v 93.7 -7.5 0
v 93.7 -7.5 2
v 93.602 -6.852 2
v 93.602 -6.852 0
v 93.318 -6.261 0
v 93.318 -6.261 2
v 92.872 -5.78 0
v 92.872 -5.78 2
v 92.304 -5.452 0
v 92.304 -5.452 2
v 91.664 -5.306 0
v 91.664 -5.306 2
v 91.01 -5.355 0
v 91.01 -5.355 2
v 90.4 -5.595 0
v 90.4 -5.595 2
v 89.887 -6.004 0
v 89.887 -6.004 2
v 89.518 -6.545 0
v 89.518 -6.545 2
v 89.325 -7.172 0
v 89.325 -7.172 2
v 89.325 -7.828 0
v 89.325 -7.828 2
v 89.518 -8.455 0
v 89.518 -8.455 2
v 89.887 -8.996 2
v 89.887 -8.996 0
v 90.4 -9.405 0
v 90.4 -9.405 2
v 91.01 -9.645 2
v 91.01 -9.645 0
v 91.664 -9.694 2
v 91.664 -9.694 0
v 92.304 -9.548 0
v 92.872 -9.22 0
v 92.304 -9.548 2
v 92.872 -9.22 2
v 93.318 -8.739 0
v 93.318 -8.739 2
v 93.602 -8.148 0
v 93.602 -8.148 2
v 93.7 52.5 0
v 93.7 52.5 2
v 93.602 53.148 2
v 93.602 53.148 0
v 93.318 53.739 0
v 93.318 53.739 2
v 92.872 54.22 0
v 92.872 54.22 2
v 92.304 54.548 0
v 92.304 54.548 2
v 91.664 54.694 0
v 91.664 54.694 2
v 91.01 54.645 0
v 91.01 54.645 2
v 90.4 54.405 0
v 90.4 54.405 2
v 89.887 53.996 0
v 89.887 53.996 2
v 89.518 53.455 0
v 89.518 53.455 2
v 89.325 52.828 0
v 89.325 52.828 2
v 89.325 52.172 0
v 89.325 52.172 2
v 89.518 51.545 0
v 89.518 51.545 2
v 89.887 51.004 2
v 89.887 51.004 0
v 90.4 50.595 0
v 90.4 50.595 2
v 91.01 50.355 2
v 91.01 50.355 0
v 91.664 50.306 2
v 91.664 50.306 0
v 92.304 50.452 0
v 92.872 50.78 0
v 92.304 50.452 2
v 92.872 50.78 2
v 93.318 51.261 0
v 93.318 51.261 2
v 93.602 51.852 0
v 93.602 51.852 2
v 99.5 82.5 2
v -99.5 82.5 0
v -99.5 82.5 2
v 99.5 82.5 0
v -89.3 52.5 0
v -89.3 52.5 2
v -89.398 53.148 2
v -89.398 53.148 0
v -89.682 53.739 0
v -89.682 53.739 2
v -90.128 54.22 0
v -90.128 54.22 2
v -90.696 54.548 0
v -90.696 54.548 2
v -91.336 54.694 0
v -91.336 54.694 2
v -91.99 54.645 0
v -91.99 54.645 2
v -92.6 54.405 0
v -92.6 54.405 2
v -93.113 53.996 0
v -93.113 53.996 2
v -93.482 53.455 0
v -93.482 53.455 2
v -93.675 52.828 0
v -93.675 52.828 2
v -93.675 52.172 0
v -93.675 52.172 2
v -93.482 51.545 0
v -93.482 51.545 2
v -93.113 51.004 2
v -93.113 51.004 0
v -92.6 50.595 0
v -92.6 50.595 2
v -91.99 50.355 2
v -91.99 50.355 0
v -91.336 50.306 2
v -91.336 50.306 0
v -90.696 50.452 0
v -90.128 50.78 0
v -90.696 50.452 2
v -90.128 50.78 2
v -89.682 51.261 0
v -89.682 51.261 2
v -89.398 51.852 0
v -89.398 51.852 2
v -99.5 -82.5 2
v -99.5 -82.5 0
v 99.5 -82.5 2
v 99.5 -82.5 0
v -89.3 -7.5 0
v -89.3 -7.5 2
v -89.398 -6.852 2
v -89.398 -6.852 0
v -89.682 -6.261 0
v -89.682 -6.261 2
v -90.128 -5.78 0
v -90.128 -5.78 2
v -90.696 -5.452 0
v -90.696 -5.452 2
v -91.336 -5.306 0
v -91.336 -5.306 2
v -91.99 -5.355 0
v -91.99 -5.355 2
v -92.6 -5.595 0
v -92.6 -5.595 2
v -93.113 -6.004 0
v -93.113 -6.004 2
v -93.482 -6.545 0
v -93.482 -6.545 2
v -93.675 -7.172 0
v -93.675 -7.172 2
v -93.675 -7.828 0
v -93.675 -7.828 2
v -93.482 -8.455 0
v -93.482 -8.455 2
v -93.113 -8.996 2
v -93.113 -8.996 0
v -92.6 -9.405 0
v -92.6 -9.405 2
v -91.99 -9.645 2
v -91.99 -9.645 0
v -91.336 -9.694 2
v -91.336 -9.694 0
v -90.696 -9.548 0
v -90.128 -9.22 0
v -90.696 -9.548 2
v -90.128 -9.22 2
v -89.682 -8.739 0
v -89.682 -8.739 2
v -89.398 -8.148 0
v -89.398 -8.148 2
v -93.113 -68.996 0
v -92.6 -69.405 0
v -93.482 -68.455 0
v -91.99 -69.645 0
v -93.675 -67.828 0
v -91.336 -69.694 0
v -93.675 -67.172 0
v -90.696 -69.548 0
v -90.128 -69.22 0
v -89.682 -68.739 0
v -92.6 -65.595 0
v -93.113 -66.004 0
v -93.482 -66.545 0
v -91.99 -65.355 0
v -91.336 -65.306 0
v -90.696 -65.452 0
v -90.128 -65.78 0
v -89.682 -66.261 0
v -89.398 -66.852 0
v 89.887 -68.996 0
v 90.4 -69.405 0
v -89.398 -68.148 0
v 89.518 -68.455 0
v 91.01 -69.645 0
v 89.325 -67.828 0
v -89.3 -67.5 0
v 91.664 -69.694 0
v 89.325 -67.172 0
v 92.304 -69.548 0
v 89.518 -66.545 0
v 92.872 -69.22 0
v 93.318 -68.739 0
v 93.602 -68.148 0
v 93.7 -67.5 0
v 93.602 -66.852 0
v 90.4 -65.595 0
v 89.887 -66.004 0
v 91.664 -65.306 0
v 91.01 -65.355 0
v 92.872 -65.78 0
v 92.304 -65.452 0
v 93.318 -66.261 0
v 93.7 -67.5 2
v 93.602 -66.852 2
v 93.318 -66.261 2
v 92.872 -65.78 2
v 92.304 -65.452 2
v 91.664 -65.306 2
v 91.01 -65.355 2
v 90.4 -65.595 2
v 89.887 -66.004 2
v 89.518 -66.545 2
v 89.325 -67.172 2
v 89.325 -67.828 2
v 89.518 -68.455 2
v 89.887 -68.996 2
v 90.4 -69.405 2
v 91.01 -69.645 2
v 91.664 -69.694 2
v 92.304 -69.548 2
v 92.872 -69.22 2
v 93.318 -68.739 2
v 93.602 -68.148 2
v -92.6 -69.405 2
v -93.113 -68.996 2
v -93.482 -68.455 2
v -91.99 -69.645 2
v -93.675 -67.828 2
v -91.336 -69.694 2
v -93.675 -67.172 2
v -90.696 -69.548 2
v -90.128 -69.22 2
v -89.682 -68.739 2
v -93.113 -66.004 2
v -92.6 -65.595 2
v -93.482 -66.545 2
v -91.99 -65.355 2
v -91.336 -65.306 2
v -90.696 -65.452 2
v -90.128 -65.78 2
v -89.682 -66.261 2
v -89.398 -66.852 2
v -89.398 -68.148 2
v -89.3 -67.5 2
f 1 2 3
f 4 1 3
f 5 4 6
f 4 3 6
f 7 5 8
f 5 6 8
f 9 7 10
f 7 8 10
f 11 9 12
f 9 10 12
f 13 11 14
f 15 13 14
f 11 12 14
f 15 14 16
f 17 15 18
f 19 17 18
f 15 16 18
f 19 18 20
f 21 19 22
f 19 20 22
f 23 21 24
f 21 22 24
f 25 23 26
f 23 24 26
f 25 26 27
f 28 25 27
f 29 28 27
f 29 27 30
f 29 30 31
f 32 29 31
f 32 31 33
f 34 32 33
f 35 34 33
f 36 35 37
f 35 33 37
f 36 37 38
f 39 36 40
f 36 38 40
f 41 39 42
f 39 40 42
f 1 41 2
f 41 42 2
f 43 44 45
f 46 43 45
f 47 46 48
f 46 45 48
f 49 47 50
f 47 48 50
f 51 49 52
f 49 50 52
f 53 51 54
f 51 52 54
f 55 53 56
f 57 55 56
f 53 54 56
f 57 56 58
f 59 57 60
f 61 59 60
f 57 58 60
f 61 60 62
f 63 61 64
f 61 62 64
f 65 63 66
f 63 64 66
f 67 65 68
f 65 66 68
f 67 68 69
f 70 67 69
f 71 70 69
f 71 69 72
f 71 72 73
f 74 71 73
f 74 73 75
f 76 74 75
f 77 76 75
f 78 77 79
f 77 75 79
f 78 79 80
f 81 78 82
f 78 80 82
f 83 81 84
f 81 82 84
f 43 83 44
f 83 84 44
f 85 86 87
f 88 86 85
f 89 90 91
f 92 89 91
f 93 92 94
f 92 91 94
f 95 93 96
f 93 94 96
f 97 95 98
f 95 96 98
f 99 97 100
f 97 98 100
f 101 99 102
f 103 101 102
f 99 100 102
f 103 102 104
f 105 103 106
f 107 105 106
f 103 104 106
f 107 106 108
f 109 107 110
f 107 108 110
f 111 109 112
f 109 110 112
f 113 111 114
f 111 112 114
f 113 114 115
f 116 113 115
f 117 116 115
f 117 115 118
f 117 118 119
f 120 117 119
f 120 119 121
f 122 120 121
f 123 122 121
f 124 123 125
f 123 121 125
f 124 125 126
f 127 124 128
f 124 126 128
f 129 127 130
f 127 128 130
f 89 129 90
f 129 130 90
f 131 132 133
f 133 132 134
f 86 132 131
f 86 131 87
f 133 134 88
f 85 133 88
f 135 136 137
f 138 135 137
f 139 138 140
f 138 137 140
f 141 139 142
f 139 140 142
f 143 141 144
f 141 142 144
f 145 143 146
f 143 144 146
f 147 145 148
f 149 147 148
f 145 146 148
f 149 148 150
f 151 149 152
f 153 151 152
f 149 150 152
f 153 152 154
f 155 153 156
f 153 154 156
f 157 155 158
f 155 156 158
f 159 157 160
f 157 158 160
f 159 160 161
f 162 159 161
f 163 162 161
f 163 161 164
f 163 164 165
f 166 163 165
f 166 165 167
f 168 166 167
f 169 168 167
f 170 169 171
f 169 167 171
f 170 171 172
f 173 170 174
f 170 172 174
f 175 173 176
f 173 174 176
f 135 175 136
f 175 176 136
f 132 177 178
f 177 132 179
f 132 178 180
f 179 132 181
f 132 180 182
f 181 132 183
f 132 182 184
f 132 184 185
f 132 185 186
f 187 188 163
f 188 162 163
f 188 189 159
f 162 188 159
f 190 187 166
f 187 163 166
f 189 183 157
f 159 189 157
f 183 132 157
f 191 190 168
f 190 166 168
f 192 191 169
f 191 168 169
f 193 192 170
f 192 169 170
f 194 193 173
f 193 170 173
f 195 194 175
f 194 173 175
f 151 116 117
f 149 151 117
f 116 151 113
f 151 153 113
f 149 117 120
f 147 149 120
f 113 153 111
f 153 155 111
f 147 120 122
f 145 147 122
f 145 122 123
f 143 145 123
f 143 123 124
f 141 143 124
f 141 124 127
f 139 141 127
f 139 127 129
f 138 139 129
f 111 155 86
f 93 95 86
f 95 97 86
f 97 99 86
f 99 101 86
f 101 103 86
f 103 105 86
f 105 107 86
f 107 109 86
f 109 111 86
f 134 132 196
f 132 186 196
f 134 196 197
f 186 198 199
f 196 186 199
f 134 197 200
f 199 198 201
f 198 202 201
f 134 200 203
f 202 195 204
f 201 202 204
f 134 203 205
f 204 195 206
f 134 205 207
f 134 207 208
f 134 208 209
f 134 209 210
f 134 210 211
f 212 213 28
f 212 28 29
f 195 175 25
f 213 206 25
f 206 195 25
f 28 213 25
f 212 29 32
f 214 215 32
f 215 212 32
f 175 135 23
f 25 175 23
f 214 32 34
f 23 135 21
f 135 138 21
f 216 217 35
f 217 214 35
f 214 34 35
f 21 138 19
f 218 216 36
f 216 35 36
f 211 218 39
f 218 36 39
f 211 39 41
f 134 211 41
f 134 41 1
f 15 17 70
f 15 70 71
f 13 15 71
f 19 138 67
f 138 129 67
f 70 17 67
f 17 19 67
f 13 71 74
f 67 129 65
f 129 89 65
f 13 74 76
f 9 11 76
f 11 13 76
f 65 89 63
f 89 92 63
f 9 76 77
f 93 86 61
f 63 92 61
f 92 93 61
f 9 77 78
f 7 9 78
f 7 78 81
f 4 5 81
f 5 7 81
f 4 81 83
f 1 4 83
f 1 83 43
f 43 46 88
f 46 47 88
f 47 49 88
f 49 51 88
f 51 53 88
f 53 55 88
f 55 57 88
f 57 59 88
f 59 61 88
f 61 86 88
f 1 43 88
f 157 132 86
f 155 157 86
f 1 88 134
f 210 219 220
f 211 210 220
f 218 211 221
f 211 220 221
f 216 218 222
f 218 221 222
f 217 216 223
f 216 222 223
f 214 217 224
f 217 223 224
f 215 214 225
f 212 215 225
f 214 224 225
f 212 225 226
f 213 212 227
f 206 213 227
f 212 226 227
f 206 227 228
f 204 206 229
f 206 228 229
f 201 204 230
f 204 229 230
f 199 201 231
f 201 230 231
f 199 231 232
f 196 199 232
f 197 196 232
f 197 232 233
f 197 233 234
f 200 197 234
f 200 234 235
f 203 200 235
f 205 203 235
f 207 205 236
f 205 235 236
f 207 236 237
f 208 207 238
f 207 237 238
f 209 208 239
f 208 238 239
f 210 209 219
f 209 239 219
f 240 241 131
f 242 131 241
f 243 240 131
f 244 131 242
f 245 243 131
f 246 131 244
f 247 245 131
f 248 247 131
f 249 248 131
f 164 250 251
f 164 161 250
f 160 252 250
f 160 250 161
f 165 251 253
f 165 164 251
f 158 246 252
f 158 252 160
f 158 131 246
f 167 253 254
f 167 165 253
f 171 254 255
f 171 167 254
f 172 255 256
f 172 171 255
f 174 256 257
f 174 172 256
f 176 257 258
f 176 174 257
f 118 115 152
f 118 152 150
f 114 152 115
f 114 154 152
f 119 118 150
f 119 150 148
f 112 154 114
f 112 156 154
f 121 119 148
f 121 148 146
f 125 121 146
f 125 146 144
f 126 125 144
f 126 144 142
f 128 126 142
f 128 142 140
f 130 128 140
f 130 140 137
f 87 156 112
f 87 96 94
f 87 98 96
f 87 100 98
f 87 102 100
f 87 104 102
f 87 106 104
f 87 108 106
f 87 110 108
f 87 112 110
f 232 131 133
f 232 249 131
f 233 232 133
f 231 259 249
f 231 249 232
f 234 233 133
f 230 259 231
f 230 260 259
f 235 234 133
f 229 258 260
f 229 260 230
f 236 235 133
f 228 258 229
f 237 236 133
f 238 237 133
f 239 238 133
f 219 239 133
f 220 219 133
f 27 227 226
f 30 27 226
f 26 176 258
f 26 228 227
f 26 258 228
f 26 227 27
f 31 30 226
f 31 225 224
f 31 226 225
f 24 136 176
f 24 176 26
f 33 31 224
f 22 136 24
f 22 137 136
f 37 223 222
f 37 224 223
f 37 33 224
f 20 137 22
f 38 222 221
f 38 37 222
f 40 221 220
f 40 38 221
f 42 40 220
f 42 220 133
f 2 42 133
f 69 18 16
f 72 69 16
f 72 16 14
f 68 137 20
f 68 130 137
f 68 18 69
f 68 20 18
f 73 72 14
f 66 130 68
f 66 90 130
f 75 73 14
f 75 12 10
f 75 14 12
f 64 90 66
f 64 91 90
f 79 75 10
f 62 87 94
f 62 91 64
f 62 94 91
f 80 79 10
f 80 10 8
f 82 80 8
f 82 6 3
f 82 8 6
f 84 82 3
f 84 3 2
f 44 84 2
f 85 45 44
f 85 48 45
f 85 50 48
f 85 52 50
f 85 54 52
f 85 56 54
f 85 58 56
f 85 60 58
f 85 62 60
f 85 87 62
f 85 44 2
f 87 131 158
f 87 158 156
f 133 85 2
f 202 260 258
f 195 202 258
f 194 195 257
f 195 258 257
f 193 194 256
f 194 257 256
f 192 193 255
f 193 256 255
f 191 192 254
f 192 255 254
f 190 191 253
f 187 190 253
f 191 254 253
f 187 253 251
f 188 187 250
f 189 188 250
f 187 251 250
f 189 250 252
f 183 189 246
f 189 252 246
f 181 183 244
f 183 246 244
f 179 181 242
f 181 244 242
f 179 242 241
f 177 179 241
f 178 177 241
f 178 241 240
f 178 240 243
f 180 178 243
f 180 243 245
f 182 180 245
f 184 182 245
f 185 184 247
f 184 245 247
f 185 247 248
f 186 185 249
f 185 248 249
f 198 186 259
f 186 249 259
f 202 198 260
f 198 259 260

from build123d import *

# Parameters (mm, degrees)
SKETCH_1_W          = 199
SKETCH_1_H          = 165
EXTRUDE_1_DEPTH     = 2
SKETCH_2_R          = 2.2
CUT_EXTRUDE_1_DEPTH = 2
SKETCH_3_R          = 2.2
CUT_EXTRUDE_2_DEPTH = 2


with BuildPart() as part:
    # ｽｹｯﾁ1 → ﾎﾞｽ - 押し出し1 (new body)
    with BuildSketch(Plane.XY):
        Rectangle(SKETCH_1_W, SKETCH_1_H)
    extrude(amount=EXTRUDE_1_DEPTH)

    # ｽｹｯﾁ2 → ｶｯﾄ - 押し出し1 (cut)
    with BuildSketch(Plane.XY.offset(2)):
        with Locations((-91.5, -67.5)):
            Circle(SKETCH_2_R)
        with Locations((-91.5, -7.5)):
            Circle(SKETCH_2_R)
        with Locations((-91.5, 52.5)):
            Circle(SKETCH_2_R)
    extrude(amount=-CUT_EXTRUDE_1_DEPTH, mode=Mode.SUBTRACT)

    # ｽｹｯﾁ3 → ｶｯﾄ - 押し出し2 (cut)
    with BuildSketch(Plane.XY.offset(2)):
        with Locations((91.5, -67.5)):
            Circle(SKETCH_3_R)
        with Locations((91.5, -7.5)):
            Circle(SKETCH_3_R)
        with Locations((91.5, 52.5)):
            Circle(SKETCH_3_R)
    extrude(amount=-CUT_EXTRUDE_2_DEPTH, mode=Mode.SUBTRACT)


solid = part.part
